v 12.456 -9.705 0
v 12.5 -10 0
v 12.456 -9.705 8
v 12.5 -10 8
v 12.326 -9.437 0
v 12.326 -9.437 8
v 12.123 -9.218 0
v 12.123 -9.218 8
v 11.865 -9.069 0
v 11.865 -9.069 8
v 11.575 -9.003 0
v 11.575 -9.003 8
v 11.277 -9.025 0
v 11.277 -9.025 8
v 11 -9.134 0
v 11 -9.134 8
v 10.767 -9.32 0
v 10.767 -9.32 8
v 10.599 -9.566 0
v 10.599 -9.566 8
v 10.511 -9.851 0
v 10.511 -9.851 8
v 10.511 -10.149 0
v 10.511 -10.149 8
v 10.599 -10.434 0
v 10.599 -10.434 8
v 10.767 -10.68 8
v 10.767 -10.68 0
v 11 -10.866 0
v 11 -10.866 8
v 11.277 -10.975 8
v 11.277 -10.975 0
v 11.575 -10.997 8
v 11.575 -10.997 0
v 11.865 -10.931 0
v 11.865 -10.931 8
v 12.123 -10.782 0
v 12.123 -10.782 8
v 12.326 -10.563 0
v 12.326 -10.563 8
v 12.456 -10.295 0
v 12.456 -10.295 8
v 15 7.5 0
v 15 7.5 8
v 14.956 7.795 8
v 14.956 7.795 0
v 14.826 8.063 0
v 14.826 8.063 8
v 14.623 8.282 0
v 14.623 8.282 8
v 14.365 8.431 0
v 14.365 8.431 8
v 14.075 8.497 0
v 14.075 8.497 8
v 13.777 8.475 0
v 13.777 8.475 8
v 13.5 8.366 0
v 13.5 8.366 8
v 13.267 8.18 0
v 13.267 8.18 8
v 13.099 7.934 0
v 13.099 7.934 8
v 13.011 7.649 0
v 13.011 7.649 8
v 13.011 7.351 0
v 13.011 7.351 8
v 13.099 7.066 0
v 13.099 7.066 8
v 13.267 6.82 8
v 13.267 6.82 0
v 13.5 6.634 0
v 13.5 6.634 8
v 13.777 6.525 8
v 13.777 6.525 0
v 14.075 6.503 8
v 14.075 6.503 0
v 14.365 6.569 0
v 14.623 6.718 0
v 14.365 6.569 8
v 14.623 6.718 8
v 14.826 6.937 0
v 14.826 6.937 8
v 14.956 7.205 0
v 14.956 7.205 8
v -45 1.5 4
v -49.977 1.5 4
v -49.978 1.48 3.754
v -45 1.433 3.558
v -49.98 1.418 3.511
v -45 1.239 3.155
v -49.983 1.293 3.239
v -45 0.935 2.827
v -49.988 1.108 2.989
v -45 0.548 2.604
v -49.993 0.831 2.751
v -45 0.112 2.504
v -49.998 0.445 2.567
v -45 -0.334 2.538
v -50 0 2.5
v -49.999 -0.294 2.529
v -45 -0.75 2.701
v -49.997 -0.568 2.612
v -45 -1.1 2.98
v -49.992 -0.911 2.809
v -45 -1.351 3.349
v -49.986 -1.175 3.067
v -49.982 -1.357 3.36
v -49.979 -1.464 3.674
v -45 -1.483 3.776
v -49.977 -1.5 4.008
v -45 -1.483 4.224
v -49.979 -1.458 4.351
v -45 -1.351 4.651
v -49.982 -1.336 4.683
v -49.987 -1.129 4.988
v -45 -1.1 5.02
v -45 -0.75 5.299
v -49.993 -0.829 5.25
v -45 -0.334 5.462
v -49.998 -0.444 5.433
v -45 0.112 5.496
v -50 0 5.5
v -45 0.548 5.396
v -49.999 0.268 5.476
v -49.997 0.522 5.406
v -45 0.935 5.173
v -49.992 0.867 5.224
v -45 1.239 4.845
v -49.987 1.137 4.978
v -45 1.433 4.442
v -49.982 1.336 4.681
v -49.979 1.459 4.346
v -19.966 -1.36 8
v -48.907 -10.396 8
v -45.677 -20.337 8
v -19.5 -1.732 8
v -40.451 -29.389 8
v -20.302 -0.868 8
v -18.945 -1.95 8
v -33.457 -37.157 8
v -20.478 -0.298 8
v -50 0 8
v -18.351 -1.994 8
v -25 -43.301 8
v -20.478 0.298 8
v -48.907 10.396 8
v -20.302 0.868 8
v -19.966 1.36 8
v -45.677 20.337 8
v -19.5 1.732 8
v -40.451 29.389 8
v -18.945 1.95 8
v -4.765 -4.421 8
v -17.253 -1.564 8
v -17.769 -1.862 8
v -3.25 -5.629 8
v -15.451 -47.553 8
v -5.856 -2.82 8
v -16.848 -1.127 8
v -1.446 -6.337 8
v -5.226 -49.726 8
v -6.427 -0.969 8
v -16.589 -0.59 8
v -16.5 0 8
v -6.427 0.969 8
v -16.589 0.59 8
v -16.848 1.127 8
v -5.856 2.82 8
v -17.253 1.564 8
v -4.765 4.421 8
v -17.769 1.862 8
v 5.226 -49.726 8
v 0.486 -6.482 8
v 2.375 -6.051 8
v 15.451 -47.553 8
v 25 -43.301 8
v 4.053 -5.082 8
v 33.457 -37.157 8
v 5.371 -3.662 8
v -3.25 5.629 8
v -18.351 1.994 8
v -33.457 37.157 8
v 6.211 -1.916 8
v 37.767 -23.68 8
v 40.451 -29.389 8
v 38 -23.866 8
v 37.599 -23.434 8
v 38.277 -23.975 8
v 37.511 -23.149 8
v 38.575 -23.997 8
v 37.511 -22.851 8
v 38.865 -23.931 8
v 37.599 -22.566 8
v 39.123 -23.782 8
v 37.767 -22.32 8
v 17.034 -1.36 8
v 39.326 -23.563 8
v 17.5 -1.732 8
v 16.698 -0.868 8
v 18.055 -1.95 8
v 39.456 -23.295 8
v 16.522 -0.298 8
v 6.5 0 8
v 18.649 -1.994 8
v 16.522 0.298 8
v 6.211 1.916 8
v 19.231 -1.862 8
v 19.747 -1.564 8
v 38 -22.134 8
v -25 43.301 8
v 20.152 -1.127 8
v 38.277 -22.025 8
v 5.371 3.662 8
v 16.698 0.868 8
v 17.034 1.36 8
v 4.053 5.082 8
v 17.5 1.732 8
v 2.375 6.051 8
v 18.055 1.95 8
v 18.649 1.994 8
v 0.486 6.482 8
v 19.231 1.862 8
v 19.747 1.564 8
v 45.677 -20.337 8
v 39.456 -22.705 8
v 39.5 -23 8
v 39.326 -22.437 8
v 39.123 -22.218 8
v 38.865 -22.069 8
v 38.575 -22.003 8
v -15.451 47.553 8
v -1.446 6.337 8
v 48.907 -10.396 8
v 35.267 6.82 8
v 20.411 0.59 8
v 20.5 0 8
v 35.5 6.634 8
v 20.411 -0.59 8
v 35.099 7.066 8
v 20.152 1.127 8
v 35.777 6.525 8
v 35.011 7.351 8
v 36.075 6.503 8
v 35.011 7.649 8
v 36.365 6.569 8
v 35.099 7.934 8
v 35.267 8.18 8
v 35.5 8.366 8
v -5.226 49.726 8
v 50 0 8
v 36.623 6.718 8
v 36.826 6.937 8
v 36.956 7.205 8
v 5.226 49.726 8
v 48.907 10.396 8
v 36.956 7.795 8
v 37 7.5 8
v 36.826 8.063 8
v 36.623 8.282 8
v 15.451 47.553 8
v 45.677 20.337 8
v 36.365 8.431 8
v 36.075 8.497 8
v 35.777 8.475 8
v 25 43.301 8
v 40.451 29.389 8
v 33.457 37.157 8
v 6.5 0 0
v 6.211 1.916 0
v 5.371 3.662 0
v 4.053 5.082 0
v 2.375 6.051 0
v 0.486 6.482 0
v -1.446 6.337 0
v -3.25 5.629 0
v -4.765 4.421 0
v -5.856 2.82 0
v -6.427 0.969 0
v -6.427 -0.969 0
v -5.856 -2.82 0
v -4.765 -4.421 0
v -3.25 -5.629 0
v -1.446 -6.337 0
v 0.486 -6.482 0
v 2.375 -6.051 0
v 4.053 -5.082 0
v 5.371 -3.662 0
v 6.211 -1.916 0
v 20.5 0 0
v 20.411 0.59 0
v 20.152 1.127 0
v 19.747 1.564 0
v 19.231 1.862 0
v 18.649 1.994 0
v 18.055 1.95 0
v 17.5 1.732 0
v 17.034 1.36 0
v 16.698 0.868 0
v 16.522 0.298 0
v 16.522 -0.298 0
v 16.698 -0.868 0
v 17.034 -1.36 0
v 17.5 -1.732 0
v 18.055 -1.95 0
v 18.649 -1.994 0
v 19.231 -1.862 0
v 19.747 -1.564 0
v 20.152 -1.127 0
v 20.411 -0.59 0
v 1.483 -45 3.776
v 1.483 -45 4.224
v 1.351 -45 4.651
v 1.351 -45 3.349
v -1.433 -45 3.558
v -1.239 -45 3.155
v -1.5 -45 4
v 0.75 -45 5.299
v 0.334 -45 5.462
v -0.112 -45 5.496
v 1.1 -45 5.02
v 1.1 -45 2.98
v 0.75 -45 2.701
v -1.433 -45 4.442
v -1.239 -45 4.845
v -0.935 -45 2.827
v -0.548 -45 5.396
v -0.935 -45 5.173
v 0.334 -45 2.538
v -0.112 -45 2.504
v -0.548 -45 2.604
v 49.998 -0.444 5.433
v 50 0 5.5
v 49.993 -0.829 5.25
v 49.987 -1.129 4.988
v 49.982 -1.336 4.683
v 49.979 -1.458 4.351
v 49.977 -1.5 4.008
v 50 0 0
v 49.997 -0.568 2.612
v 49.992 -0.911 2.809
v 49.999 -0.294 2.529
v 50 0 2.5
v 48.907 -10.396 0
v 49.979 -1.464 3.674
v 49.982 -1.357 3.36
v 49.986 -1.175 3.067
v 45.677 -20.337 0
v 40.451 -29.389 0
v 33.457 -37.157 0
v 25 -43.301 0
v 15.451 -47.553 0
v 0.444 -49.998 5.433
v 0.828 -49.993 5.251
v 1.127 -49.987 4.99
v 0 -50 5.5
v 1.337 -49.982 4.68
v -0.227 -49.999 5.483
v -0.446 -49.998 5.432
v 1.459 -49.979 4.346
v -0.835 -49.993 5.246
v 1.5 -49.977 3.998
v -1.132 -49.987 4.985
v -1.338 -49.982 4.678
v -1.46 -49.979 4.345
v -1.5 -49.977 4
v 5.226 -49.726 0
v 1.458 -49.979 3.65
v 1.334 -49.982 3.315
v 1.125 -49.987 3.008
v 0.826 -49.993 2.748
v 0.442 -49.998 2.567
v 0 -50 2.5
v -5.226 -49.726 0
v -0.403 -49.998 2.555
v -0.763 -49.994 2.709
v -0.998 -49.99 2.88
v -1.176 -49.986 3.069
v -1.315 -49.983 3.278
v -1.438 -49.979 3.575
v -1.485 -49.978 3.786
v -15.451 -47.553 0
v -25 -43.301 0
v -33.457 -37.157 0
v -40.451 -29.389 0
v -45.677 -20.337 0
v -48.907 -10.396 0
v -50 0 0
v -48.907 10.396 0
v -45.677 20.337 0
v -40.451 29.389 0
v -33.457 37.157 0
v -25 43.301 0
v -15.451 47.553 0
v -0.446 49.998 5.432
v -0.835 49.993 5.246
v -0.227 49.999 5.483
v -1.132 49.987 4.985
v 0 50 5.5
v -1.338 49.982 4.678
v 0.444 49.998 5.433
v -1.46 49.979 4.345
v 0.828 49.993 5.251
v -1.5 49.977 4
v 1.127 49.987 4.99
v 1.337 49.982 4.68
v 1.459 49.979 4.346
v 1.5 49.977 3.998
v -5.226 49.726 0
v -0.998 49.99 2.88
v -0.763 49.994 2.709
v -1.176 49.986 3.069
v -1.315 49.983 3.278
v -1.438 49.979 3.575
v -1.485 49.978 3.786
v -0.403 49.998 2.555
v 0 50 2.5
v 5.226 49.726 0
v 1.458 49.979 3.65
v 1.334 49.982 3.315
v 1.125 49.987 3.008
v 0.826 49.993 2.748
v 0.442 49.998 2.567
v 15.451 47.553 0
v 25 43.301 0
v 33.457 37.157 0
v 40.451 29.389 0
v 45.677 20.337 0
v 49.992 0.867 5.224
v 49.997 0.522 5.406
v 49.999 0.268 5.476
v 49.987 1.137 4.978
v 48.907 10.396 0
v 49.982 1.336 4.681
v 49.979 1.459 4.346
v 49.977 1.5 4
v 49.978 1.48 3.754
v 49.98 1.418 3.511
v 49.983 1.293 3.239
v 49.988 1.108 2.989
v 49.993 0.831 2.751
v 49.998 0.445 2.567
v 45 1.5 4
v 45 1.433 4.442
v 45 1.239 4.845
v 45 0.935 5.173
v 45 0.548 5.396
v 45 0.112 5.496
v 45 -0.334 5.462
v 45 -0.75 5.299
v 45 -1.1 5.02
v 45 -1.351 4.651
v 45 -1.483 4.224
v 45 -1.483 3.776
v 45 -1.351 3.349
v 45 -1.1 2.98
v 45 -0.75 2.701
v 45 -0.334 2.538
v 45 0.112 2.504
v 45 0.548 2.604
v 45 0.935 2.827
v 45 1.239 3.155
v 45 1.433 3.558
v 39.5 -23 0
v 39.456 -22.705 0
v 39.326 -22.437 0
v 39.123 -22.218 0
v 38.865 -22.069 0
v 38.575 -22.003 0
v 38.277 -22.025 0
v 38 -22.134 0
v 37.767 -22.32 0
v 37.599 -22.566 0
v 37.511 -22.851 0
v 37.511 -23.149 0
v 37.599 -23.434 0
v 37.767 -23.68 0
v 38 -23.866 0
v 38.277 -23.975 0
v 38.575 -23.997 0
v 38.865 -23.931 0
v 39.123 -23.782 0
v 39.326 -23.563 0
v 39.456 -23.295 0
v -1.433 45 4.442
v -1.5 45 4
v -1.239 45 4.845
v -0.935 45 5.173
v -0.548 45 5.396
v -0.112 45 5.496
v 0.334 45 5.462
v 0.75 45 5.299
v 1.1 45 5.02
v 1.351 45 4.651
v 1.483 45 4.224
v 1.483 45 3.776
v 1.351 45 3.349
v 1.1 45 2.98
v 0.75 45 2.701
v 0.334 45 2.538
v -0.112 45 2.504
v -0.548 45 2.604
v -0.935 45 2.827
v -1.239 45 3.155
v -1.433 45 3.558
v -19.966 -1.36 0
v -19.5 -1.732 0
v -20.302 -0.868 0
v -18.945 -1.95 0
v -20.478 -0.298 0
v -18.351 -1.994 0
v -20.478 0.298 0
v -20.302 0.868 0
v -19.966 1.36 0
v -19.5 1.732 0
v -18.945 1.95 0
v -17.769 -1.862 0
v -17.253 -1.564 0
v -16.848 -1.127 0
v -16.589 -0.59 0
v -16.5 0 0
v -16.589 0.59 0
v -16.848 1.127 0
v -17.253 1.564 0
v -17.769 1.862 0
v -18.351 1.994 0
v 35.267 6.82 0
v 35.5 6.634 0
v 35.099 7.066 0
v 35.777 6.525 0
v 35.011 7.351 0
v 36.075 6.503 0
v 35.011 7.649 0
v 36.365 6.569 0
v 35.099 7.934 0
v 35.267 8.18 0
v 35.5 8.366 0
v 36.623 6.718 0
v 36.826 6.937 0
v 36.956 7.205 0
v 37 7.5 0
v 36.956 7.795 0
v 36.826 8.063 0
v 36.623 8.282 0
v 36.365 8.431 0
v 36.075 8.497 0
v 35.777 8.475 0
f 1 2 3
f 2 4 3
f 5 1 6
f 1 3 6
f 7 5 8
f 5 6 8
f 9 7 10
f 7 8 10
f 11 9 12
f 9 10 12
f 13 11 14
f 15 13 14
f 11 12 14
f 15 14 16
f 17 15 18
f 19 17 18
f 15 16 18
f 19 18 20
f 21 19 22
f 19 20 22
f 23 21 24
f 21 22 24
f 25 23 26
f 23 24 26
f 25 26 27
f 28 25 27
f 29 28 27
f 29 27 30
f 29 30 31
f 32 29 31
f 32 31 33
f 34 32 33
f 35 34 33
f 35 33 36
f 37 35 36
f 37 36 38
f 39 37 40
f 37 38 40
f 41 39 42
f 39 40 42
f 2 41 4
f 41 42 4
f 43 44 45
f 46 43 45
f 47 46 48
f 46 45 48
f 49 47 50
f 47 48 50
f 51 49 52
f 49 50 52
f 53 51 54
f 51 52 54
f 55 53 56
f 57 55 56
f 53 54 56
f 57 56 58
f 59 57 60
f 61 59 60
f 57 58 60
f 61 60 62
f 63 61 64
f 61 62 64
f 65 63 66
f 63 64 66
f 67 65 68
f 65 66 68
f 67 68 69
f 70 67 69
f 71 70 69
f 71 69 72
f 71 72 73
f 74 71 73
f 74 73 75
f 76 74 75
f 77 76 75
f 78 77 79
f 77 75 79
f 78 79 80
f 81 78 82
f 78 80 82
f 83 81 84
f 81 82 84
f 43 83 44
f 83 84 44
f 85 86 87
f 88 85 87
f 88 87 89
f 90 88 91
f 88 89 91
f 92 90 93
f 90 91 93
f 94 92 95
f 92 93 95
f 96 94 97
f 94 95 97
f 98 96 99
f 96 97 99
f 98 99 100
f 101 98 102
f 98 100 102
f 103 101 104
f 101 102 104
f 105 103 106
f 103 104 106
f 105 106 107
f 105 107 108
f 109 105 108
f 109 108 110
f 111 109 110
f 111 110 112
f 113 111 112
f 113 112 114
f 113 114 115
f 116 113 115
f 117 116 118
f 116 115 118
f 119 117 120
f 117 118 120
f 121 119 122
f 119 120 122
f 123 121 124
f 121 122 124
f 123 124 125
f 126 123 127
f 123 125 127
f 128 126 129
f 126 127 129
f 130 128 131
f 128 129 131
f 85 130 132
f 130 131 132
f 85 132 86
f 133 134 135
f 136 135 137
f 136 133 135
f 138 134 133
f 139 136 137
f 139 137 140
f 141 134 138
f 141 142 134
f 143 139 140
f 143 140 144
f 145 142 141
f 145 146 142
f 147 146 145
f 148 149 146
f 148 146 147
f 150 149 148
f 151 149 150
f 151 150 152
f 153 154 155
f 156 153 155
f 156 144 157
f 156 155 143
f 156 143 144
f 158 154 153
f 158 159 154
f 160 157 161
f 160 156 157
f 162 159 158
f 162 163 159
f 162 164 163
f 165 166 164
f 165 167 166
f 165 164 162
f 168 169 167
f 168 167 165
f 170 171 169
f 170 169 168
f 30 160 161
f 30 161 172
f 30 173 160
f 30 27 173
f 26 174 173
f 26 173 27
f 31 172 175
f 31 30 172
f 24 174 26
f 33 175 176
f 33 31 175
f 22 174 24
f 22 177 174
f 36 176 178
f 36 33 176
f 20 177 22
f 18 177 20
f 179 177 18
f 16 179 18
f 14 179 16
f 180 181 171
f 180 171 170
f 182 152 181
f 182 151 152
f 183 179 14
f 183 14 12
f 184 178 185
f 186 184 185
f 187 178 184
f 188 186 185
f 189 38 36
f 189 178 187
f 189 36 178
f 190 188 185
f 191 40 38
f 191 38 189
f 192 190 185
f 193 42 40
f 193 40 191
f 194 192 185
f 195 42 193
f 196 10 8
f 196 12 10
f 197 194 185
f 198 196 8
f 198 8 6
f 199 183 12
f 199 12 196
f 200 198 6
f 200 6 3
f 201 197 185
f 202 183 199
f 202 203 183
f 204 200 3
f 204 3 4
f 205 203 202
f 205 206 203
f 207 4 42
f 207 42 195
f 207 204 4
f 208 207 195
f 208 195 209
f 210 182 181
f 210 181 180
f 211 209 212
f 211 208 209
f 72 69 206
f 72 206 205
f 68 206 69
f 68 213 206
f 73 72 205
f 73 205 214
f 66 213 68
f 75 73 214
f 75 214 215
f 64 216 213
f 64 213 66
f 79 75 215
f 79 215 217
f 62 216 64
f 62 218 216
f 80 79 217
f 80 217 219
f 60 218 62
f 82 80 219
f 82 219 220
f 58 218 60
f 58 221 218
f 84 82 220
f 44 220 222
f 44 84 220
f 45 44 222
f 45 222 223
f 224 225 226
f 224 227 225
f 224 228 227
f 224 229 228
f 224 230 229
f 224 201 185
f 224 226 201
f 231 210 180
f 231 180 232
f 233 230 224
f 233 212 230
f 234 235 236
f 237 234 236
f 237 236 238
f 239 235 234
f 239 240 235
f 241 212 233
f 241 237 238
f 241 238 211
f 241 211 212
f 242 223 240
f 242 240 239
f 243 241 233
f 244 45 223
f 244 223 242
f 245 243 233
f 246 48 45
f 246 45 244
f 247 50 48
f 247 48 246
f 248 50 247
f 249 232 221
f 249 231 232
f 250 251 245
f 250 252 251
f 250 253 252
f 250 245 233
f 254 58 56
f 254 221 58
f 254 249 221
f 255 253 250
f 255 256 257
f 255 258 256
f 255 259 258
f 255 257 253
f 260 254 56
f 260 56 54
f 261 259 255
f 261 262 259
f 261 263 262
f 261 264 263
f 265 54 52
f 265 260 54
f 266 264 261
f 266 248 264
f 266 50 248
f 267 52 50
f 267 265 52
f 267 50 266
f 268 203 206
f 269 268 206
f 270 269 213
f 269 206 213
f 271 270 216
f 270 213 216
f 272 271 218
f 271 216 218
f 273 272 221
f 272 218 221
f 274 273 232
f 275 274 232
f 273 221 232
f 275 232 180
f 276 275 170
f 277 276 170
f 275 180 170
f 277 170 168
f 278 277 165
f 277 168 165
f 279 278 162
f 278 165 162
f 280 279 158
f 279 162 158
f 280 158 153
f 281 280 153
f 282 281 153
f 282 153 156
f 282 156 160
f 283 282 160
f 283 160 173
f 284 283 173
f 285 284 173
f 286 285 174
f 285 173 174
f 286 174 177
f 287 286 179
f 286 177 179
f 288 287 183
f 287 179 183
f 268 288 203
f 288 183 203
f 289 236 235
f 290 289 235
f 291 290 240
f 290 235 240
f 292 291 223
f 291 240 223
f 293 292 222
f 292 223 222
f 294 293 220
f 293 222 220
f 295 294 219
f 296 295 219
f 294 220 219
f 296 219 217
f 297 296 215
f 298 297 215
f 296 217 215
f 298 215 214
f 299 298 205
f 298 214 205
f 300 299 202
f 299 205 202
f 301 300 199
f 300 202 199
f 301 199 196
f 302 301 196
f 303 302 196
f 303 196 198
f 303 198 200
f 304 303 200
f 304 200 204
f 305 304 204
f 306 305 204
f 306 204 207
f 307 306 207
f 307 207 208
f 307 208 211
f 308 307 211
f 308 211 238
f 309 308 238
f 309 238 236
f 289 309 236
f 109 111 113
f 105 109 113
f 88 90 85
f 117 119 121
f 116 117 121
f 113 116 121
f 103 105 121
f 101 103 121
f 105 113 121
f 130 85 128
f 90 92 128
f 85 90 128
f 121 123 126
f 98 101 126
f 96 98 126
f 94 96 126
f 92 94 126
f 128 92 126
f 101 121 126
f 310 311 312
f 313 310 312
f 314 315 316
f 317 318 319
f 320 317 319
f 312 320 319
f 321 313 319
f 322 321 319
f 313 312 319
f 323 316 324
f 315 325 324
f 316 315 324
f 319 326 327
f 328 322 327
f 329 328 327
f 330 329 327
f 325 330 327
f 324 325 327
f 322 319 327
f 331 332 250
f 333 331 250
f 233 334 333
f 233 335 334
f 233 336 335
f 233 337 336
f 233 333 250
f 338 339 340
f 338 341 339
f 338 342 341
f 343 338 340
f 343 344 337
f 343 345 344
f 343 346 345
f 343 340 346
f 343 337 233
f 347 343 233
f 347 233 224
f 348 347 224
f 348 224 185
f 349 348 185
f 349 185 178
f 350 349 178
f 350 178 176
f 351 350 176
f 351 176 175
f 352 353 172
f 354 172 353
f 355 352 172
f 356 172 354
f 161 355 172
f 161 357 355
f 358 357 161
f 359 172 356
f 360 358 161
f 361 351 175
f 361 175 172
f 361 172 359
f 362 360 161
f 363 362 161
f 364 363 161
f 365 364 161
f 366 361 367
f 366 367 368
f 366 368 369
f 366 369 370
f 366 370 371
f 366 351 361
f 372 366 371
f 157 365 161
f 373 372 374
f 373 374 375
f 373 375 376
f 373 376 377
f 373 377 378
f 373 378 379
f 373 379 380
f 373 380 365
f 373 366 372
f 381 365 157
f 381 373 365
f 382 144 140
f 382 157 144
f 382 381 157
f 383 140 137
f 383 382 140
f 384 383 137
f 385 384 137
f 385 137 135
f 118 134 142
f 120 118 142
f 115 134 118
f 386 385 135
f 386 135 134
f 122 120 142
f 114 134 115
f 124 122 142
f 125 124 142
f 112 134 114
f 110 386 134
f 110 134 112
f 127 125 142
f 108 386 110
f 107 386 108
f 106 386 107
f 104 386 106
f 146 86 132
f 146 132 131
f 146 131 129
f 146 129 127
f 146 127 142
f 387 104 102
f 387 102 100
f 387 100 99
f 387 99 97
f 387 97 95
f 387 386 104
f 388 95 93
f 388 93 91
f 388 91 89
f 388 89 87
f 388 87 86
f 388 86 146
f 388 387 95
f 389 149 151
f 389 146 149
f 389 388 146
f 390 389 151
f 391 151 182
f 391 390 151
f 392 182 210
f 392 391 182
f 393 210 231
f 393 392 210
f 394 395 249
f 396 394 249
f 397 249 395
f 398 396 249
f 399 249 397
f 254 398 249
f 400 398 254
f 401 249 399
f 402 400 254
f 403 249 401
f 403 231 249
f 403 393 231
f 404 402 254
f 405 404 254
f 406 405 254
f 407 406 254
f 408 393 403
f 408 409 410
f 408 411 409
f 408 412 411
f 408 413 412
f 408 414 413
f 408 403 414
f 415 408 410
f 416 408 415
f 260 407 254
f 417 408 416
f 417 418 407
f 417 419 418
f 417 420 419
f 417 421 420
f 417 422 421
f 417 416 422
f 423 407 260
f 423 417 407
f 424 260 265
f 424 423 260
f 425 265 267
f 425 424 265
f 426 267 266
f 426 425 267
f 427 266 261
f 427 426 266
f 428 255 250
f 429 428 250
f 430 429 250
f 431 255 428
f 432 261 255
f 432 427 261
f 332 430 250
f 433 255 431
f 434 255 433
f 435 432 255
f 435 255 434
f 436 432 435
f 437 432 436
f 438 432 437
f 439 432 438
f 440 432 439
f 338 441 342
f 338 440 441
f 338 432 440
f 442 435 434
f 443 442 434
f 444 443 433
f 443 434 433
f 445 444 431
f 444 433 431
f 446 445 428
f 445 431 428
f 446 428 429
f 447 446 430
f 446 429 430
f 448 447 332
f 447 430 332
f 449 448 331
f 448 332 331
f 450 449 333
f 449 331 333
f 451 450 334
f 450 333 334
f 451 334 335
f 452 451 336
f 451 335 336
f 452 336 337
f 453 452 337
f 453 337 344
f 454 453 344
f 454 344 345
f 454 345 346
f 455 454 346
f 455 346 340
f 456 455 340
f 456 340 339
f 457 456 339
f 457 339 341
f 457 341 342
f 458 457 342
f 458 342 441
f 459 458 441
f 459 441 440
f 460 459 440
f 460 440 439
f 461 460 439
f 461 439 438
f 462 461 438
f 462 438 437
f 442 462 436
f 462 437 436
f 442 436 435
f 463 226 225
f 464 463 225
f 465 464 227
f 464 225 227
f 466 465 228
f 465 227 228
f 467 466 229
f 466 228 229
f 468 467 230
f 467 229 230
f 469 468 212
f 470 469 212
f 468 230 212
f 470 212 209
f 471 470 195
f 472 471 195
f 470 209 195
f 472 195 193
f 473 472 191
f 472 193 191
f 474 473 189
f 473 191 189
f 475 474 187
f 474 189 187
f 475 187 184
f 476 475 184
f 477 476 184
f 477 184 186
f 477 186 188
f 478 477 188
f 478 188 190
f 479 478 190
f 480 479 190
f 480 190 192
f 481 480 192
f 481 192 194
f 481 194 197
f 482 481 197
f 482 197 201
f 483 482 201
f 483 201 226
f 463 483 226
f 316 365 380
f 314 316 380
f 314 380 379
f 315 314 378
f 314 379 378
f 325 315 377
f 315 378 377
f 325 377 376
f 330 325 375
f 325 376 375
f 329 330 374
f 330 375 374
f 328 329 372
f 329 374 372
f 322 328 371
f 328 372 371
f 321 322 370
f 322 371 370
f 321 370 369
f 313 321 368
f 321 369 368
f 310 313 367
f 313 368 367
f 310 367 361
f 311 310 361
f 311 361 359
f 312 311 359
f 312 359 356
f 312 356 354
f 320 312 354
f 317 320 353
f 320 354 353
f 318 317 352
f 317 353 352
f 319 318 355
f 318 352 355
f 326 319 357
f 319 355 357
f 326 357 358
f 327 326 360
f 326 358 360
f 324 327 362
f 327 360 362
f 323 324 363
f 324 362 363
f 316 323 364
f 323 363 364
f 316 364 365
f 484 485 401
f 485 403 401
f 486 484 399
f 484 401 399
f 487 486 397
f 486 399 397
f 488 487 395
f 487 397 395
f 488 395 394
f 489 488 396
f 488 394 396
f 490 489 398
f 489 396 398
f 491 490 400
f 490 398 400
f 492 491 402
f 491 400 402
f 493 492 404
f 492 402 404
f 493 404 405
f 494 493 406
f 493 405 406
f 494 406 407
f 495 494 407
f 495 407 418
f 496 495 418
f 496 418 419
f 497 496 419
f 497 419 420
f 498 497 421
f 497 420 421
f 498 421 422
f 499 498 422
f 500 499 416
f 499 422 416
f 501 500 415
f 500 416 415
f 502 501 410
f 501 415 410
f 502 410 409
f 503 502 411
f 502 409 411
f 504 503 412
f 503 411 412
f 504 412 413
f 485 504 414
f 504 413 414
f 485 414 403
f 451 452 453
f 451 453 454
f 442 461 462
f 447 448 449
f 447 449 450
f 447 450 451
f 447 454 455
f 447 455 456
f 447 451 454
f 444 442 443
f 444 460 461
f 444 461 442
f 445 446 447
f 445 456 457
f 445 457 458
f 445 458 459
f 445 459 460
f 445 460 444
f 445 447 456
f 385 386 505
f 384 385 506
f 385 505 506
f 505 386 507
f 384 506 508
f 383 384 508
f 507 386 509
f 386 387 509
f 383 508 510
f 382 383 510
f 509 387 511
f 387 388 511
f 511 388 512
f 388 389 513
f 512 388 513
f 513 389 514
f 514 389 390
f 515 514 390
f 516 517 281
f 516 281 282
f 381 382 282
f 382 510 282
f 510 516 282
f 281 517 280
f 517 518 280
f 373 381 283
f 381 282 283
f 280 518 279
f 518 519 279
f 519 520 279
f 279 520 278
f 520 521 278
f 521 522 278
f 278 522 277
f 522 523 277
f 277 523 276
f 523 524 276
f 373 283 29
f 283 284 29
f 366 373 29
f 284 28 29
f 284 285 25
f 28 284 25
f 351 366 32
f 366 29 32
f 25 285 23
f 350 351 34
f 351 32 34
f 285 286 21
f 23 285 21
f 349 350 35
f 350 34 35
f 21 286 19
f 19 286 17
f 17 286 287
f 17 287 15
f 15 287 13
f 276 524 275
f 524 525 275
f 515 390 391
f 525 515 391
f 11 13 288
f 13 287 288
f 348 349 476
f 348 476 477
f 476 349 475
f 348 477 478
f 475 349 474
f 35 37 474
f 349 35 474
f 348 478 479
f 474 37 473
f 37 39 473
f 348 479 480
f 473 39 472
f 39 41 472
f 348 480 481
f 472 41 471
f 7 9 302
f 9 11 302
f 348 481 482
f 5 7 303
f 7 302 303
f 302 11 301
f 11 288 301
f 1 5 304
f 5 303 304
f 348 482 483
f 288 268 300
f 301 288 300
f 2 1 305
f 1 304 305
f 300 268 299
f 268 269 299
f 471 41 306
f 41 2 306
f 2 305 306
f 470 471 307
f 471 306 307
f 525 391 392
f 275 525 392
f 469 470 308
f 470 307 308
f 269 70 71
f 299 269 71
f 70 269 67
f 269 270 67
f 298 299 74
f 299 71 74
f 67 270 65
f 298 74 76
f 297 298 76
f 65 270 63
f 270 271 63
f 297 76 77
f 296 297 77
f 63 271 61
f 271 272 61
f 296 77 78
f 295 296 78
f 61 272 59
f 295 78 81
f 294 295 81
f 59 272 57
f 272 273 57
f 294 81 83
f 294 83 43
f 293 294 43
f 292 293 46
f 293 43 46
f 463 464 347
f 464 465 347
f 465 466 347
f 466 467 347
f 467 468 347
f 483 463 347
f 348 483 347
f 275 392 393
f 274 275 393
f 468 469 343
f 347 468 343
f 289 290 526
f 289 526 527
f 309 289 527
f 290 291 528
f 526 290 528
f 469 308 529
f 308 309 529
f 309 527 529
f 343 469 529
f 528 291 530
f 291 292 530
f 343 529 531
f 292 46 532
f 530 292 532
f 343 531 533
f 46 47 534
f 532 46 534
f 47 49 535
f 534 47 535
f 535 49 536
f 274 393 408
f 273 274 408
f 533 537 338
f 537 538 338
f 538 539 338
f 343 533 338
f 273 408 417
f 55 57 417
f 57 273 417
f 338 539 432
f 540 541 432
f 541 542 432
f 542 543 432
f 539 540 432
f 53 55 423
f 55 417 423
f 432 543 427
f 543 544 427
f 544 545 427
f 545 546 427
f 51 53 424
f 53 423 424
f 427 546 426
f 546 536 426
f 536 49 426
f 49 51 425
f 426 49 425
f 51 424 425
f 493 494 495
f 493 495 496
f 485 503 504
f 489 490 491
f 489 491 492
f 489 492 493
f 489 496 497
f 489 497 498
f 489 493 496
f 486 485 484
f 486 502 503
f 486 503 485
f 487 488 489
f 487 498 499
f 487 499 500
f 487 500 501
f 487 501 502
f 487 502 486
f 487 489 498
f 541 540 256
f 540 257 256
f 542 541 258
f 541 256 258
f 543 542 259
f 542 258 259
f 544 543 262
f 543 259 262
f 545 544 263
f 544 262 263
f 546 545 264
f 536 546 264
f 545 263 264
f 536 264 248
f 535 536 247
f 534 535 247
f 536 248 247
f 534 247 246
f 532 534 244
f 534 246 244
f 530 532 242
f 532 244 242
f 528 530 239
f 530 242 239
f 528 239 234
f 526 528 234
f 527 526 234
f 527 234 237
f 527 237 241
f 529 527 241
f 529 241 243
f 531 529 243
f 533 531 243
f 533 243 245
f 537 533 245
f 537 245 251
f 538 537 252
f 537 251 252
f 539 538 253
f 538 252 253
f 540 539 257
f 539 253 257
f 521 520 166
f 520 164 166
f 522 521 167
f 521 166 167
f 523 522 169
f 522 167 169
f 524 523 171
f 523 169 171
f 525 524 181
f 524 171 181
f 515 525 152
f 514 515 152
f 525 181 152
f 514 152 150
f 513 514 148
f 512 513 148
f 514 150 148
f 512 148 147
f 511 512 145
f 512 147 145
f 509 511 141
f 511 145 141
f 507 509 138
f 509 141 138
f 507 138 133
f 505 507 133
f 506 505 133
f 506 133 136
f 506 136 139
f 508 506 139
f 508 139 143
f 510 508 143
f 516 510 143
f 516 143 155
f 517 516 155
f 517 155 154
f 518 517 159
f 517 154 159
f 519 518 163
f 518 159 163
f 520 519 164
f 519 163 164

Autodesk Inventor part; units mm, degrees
sketch "スケッチ1" plane through (0, 0, 0) normal (0, 0, 1) x (1, 0, 0)
  circle A0 centre (0, 0) radius 50
  dimension "d0" = 100
extrude "押し出し1" add sketch "スケッチ1" along normal blind 8
ref_plane "作業平面1" through (50, 0, 0) normal (1, 0, 0) x (0, 1, 0)
ref_plane "作業平面2" through (-50, 0, 0) normal (1, 0, 0) x (0, 1, 0)
ref_plane "作業平面3" through (0, 50, 0) normal (0, 1, 0) x (-1, 0, 0)
ref_plane "作業平面4" through (0, -50, 0) normal (0, 1, 0) x (-1, 0, 0)
sketch "スケッチ2" plane through (50, 0, 0) normal (1, 0, 0) x (0, 1, 0)
  line L0 (0, 0) -> (0, 4) construction
  circle A0 centre (0, 4) radius 1.5
  dimension "d7" = 4
  dimension "d8" = 3
extrude "押し出し2" cut sketch "スケッチ2" against normal blind 5
sketch "スケッチ3" plane through (-50, 0, 0) normal (1, 0, 0) x (0, 1, 0)
  line L0 (0, 0) -> (0, 4) construction
  circle A0 centre (0, 4) radius 1.5
  dimension "d11" = 4
  dimension "d12" = 3
extrude "押し出し3" cut sketch "スケッチ3" along normal blind 5
sketch "スケッチ4" plane through (0, 50, 0) normal (0, 1, 0) x (-1, 0, 0)
  line L0 (0, 0) -> (0, 4) construction
  circle A0 centre (0, 4) radius 1.5
  dimension "d15" = 4
  dimension "d16" = 3
extrude "押し出し4" cut sketch "スケッチ4" against normal blind 5
sketch "スケッチ5" plane through (0, -50, 0) normal (0, 1, 0) x (-1, 0, 0)
  line L0 (0, 0) -> (0, 4) construction
  circle A0 centre (0, 4) radius 1.5
  dimension "d19" = 4
  dimension "d20" = 3
extrude "押し出し5" cut sketch "スケッチ5" along normal blind 5
thread "ねじ1" size "M3x0.5" class "6H" standard "ANSI Metric M Profile" full length
thread "ねじ2" size "M3x0.5" class "6H" standard "ANSI Metric M Profile" full length
thread "ねじ3" size "M3x0.5" class "6H" standard "ANSI Metric M Profile" full length
thread "ねじ4" size "M3x0.5" class "6H" standard "ANSI Metric M Profile" full length
sketch "スケッチ8" plane through (0, 0, 8) normal (0, 0, 1) x (1, 0, 0)
  line L0 (0, 0) -> (18.5, 0) construction
  line L1 (0, 0) -> (-18.5, 0) construction
  circle A0 centre (18.5, 0) radius 2
  circle A1 centre (-18.5, 0) radius 2
  circle A2 centre (0, 0) radius 6.5
  dimension "d62" = 18.5
  dimension "d63" = 18.5
  dimension "d64" = 4
  dimension "d65" = 4
  dimension "d66" = 13
extrude "押し出し7" cut sketch "スケッチ8" against normal blind 8
thread "ねじ7" size "M4x0.7" class "6H" standard "ANSI Metric M Profile" full length
thread "ねじ8" size "M4x0.7" class "6H" standard "ANSI Metric M Profile" full length
sketch "スケッチ9" plane through (0, 0, 8) normal (0, 0, 1) x (1, 0, 0)
  line L0 (0, 0) -> (25, 0) construction
  line L1 (25, 0) -> (25, -1) construction
  line L2 (25, 0) -> (25, 7.5) construction
  circle A0 centre (36, 7.5) radius 1
  line L3 (36, 7.5) -> (14, 7.5) construction
  circle A1 centre (14, 7.5) radius 1
  line L4 (25, -1) -> (25, -10) construction
  line L5 (25, -10) -> (25, -23) construction
  line L6 (25, 0) -> (9, 0) construction
  line L7 (9, 0) -> (9, -31) construction
  line L8 (9, -31) -> (41, -31) construction
  line L9 (41, -31) -> (41, 0) construction
  line L10 (25, 0) -> (25, 12) construction
  line L11 (14.417, 12) -> (35.583, 12) construction
  arc A2 (14.757, 12.2915) -> (9, 0) centre (25, 0) ccw construction
  arc A3 (41, 0) -> (35.583, 12) centre (25, 0) ccw construction
  line L12 (25, -10) -> (11.5, -10) construction
  line L13 (25, -23) -> (38.5, -23) construction
  circle A4 centre (11.5, -10) radius 1
  circle A5 centre (38.5, -23) radius 1
  dimension "d92" = 25
  dimension "d103" = 7.5
  dimension "d105" = 2
  dimension "d108" = 2
  dimension "d109" = 17.5
  dimension "d112" = 13
  dimension "d129" = 16
  dimension "d130" = 31
  dimension "d131" = 32
  dimension "d134" = 22
  dimension "d135" = 13.5
  dimension "d136" = 13.5
  dimension "d137" = 2
  dimension "d138" = 2
extrude "押し出し10" cut sketch "スケッチ9" against normal blind 8
properties part number "outsideCover"
